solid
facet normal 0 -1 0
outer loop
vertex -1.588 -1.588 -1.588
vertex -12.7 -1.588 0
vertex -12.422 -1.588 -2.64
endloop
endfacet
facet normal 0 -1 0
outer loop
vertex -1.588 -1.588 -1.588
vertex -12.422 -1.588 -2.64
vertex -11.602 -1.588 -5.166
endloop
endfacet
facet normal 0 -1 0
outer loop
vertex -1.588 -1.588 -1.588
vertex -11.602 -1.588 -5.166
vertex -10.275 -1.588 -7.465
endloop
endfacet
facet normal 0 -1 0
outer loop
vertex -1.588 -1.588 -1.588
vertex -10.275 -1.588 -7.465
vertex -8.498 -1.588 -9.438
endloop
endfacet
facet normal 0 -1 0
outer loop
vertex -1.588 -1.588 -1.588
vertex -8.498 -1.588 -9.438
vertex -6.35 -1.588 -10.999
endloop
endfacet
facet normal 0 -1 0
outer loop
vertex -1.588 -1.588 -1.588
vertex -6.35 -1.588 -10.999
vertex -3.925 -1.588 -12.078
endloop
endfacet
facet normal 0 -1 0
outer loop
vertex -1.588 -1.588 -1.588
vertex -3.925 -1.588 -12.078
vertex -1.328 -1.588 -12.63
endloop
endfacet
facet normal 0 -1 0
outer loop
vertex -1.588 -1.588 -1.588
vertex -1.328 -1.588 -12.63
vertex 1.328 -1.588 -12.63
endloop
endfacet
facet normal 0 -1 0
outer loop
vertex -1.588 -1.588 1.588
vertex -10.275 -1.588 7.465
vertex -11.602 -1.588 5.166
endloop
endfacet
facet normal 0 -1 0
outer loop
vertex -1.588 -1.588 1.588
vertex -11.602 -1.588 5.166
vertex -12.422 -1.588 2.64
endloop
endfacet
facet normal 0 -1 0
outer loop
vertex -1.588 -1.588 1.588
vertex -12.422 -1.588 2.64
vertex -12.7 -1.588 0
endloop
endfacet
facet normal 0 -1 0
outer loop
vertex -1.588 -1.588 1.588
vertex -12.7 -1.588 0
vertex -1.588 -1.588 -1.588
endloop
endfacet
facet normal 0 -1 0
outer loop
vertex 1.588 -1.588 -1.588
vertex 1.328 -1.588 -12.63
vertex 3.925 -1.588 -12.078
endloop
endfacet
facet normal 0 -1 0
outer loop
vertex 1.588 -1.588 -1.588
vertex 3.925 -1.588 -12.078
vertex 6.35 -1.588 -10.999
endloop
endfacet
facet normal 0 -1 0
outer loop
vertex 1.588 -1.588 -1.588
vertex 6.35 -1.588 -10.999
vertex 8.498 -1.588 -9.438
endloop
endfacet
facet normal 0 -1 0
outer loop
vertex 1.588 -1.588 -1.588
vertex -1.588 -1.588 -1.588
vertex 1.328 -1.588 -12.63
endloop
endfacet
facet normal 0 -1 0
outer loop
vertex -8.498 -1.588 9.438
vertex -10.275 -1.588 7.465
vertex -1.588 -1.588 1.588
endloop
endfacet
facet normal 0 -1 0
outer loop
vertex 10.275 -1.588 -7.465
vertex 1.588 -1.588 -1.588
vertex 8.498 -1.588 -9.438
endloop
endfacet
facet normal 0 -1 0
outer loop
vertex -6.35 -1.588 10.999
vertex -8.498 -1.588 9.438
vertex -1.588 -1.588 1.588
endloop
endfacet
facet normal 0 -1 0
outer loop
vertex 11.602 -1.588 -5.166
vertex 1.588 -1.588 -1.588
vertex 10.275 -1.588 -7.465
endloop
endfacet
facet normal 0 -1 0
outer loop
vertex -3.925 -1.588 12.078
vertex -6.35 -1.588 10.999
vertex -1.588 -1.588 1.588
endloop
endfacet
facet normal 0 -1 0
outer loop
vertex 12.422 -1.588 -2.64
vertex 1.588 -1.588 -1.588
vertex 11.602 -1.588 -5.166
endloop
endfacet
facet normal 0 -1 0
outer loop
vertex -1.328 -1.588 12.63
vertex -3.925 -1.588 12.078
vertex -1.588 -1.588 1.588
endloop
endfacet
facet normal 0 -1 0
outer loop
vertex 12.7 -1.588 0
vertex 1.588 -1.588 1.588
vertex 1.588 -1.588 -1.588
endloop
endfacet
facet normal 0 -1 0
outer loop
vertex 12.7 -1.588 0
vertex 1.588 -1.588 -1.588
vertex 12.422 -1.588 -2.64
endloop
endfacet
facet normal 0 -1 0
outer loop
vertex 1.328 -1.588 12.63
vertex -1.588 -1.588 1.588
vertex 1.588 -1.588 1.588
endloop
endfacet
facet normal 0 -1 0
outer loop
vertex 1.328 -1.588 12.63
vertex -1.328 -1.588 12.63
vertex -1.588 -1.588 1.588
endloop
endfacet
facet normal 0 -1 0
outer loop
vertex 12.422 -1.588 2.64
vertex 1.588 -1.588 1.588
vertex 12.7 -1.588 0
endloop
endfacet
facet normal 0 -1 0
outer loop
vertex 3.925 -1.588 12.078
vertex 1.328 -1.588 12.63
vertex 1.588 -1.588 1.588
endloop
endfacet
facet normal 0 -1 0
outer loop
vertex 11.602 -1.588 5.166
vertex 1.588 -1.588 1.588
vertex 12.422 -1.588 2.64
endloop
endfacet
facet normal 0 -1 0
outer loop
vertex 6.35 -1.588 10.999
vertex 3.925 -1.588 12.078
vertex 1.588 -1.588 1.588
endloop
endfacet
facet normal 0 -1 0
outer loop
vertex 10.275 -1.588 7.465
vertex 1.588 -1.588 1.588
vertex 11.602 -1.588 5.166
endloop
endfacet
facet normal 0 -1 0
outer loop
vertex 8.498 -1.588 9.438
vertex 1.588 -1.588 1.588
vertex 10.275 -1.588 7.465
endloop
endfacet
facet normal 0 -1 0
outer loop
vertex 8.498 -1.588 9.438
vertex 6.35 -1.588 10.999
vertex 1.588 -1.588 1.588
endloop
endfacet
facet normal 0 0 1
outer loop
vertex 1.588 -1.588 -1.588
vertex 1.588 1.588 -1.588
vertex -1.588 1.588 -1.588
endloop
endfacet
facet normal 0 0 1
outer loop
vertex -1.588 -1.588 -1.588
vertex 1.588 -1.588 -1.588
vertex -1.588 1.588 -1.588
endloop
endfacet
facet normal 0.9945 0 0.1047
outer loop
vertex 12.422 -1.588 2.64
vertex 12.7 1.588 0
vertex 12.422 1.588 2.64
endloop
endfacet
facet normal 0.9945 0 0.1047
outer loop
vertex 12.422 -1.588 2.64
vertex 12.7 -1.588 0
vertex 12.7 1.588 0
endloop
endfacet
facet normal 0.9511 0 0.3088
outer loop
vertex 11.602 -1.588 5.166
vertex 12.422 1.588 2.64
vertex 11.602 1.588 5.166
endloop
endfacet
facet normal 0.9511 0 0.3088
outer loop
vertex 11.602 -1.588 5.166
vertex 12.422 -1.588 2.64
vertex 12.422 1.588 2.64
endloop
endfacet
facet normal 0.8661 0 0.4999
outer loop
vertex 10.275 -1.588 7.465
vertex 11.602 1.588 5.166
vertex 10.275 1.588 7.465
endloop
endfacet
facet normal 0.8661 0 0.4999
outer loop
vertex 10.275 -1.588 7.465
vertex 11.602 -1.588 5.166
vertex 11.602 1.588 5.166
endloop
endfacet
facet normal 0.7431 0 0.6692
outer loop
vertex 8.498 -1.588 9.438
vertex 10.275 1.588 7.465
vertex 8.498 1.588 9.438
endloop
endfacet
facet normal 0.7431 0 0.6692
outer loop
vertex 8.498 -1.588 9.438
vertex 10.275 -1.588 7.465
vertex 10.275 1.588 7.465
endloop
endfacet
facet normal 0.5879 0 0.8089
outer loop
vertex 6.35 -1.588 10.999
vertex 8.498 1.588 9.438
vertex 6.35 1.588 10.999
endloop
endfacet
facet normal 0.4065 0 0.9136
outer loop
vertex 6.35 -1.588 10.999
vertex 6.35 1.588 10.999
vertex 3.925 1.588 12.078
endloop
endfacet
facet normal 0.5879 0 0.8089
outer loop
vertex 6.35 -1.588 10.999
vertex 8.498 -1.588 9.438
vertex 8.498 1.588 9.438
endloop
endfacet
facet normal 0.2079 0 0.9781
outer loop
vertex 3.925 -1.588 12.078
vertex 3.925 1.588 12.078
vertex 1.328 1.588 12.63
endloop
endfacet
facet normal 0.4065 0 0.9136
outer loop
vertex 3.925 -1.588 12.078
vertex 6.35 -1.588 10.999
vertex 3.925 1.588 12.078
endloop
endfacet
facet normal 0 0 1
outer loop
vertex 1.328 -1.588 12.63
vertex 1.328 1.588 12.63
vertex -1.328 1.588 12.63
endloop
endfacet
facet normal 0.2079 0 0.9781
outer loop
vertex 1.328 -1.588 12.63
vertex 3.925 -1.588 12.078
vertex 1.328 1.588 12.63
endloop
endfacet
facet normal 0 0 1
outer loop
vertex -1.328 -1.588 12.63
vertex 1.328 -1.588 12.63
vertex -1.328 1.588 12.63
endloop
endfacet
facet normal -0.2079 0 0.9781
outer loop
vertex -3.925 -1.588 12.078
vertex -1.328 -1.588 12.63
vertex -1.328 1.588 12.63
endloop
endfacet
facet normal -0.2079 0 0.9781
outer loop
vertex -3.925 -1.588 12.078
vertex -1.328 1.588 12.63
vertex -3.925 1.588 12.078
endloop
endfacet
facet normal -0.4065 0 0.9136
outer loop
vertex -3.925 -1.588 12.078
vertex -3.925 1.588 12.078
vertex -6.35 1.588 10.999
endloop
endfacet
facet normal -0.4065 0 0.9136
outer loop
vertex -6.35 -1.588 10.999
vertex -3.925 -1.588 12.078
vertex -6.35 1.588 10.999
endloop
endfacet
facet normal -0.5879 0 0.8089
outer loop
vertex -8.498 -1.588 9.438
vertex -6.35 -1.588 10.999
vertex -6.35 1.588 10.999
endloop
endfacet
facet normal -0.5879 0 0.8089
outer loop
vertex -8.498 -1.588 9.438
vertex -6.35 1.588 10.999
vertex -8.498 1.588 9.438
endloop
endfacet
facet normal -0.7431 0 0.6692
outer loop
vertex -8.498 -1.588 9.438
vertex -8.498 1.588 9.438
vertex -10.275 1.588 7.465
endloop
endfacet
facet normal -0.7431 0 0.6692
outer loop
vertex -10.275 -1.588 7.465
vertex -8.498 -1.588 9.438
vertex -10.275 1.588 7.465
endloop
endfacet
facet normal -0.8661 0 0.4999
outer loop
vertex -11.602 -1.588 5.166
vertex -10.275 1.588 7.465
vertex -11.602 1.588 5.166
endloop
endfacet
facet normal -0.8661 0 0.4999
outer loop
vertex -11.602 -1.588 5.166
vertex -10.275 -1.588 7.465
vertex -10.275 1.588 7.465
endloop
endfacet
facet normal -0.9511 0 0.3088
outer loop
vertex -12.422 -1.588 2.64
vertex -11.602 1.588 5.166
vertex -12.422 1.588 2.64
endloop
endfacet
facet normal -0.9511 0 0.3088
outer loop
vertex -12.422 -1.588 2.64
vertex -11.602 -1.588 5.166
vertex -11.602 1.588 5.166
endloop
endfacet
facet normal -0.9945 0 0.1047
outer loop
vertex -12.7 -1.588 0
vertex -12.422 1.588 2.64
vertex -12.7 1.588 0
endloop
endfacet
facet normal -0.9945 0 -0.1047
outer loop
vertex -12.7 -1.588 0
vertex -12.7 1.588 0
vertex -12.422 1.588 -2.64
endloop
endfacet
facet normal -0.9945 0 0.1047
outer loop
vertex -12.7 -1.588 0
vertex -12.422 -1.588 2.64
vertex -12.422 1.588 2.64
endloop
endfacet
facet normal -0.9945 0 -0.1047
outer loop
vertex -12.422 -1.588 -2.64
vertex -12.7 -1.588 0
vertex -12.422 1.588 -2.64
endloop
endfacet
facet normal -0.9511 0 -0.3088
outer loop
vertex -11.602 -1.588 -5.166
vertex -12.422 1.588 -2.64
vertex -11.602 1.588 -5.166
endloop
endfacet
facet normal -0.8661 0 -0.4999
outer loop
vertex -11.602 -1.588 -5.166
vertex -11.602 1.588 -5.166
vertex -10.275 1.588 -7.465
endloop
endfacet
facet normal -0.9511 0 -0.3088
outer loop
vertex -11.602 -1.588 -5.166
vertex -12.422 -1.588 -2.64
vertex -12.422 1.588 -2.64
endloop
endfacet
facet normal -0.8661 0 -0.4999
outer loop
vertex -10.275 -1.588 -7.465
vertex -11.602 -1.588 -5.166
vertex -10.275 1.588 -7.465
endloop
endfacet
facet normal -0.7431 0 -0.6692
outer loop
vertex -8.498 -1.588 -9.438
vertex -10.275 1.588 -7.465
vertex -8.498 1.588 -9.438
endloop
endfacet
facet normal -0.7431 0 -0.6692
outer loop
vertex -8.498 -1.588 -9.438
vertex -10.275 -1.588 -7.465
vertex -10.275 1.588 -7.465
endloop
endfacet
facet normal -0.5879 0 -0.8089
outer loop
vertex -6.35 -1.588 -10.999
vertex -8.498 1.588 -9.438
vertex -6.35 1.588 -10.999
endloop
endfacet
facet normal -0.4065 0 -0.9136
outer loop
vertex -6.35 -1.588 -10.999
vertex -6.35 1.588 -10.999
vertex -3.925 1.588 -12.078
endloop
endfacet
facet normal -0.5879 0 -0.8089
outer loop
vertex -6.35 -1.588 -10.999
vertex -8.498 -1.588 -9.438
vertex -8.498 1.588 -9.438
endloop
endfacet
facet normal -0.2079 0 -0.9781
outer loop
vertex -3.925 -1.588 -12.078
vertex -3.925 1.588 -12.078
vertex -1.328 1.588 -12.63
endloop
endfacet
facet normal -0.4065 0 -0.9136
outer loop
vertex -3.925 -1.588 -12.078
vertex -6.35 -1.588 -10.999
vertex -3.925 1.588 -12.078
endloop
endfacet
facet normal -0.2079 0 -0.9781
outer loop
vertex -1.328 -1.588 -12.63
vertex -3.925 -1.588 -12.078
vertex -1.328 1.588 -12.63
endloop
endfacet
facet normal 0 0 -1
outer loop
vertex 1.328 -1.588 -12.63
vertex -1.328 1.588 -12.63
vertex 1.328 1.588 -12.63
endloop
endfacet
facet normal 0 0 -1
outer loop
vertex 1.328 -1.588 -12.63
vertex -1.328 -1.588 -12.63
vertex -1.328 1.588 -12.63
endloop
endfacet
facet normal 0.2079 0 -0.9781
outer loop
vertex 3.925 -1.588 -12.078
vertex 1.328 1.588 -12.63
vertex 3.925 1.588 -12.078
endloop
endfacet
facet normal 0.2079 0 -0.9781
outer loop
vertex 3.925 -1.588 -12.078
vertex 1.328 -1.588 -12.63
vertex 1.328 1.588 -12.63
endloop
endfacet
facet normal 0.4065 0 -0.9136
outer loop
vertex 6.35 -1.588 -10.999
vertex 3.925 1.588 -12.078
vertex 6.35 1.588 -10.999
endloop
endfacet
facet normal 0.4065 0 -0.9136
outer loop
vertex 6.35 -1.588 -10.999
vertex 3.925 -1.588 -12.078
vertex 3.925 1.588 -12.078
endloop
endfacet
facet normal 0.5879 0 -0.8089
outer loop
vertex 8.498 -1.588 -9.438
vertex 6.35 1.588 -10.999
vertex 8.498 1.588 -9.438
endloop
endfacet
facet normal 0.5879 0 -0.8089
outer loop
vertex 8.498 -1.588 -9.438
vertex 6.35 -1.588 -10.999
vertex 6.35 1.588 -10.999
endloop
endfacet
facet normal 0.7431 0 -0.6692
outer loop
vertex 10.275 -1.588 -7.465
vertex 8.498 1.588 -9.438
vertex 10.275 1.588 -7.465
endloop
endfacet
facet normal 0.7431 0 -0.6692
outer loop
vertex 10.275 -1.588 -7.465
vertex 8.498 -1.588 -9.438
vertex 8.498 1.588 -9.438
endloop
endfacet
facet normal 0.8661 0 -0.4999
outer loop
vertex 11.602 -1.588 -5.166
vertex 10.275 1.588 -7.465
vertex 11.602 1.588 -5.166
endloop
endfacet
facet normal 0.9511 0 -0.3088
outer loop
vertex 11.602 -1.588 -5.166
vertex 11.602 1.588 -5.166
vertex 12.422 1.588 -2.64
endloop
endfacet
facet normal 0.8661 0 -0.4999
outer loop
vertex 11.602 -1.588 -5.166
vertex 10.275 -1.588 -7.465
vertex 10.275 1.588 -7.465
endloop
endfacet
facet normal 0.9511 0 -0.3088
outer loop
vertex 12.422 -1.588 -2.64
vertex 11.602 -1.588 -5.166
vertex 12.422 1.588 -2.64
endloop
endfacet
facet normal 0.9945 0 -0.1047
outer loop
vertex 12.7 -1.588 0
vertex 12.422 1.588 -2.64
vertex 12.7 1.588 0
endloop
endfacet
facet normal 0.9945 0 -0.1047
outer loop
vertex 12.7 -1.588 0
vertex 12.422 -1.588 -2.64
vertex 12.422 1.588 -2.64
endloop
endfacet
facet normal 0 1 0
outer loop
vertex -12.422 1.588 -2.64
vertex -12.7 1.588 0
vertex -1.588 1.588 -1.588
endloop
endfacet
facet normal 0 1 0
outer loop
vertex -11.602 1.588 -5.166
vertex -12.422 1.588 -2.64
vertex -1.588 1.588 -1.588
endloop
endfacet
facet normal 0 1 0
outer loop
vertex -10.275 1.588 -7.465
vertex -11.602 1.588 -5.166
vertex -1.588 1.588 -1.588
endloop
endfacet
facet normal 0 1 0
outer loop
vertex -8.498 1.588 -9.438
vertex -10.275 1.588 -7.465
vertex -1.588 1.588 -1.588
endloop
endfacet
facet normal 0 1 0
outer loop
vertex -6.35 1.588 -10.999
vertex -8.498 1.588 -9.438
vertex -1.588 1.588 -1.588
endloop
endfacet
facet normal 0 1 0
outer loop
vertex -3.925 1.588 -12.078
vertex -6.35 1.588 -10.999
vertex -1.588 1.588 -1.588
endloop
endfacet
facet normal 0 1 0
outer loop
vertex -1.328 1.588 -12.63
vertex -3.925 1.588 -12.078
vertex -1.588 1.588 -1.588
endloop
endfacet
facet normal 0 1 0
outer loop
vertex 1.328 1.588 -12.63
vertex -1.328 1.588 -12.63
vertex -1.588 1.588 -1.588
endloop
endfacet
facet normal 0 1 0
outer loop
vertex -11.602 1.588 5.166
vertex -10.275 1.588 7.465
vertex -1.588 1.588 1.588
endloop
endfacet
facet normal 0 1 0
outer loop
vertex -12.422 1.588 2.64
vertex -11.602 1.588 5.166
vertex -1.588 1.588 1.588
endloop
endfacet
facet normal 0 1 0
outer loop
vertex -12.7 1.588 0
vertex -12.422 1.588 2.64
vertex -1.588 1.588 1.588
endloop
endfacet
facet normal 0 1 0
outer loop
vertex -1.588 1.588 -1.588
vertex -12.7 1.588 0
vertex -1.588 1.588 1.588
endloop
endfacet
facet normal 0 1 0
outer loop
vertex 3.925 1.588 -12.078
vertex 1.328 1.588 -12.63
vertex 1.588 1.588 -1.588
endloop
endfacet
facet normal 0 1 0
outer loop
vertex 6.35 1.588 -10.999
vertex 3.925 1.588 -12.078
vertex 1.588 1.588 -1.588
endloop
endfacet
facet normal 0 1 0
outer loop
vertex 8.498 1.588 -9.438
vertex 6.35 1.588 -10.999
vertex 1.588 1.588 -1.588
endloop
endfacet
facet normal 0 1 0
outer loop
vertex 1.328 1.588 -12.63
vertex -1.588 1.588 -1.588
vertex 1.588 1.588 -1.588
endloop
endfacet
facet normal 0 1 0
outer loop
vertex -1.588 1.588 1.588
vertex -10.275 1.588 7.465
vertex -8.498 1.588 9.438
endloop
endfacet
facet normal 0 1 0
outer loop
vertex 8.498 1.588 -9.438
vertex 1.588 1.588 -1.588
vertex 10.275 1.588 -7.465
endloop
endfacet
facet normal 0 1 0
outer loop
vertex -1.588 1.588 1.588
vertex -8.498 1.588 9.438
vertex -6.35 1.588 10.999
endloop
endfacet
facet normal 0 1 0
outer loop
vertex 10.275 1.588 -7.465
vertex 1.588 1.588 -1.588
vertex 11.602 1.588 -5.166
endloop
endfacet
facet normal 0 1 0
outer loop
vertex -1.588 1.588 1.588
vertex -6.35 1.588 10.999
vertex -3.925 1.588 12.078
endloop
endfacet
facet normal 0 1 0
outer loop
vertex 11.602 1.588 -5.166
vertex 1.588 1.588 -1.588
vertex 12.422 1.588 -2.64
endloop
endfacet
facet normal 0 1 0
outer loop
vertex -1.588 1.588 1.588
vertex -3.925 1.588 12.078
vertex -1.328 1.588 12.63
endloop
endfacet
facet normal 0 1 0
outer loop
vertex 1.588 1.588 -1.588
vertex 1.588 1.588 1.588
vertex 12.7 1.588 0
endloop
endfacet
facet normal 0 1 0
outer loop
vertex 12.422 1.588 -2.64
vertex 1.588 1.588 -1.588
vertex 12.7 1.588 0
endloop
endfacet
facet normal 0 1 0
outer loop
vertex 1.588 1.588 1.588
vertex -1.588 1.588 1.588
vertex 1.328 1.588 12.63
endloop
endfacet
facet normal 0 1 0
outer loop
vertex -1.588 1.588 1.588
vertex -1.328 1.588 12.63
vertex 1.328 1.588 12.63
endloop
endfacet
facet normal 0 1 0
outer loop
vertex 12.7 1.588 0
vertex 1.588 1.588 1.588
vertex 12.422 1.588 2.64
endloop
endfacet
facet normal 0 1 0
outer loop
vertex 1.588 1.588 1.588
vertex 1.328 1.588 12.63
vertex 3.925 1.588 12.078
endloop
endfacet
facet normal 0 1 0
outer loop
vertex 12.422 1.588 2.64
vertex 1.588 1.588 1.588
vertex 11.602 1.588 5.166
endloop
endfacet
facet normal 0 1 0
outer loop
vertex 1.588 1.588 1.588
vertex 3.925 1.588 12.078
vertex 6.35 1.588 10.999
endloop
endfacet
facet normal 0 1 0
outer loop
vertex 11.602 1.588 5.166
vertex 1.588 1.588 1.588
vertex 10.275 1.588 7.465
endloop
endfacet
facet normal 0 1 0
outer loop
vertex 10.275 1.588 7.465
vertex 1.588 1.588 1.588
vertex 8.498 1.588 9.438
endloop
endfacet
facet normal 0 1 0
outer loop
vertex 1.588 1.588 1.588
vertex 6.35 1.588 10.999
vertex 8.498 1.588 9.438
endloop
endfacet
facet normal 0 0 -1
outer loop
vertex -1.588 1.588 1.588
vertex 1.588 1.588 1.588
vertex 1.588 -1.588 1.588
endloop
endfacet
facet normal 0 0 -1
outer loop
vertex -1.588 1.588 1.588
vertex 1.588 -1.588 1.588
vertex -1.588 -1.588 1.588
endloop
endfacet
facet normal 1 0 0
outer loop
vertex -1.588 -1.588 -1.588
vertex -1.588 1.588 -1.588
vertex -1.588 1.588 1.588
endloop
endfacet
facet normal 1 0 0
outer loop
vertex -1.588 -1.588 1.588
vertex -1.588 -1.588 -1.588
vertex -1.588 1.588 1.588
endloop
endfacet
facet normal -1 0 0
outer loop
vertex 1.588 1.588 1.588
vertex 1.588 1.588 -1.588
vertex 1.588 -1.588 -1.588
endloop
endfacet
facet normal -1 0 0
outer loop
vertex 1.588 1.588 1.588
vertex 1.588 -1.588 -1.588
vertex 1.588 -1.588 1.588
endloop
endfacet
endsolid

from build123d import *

# Parameters (mm, degrees)
F0_R     = 12.7
F1_DEPTH = 1.5875
F2_W     = 3.175
F2_H     = 3.175
F3_DEPTH = 3.176


with BuildPart() as f1:
    # F0 (on Front) → F1 (new body, symmetric)
    with BuildSketch(Plane.XZ):
        Circle(F0_R)
    extrude(amount=F1_DEPTH, both=True)

    # F2 (on face) → F3 (cut, through all)
    with BuildSketch(Plane(origin=(0, 1.5875, 0), x_dir=(-1, 0, 0), z_dir=(0, 1, 0))):
        Rectangle(F2_W, F2_H)
    extrude(amount=-F3_DEPTH, mode=Mode.SUBTRACT)


solid = f1.part
